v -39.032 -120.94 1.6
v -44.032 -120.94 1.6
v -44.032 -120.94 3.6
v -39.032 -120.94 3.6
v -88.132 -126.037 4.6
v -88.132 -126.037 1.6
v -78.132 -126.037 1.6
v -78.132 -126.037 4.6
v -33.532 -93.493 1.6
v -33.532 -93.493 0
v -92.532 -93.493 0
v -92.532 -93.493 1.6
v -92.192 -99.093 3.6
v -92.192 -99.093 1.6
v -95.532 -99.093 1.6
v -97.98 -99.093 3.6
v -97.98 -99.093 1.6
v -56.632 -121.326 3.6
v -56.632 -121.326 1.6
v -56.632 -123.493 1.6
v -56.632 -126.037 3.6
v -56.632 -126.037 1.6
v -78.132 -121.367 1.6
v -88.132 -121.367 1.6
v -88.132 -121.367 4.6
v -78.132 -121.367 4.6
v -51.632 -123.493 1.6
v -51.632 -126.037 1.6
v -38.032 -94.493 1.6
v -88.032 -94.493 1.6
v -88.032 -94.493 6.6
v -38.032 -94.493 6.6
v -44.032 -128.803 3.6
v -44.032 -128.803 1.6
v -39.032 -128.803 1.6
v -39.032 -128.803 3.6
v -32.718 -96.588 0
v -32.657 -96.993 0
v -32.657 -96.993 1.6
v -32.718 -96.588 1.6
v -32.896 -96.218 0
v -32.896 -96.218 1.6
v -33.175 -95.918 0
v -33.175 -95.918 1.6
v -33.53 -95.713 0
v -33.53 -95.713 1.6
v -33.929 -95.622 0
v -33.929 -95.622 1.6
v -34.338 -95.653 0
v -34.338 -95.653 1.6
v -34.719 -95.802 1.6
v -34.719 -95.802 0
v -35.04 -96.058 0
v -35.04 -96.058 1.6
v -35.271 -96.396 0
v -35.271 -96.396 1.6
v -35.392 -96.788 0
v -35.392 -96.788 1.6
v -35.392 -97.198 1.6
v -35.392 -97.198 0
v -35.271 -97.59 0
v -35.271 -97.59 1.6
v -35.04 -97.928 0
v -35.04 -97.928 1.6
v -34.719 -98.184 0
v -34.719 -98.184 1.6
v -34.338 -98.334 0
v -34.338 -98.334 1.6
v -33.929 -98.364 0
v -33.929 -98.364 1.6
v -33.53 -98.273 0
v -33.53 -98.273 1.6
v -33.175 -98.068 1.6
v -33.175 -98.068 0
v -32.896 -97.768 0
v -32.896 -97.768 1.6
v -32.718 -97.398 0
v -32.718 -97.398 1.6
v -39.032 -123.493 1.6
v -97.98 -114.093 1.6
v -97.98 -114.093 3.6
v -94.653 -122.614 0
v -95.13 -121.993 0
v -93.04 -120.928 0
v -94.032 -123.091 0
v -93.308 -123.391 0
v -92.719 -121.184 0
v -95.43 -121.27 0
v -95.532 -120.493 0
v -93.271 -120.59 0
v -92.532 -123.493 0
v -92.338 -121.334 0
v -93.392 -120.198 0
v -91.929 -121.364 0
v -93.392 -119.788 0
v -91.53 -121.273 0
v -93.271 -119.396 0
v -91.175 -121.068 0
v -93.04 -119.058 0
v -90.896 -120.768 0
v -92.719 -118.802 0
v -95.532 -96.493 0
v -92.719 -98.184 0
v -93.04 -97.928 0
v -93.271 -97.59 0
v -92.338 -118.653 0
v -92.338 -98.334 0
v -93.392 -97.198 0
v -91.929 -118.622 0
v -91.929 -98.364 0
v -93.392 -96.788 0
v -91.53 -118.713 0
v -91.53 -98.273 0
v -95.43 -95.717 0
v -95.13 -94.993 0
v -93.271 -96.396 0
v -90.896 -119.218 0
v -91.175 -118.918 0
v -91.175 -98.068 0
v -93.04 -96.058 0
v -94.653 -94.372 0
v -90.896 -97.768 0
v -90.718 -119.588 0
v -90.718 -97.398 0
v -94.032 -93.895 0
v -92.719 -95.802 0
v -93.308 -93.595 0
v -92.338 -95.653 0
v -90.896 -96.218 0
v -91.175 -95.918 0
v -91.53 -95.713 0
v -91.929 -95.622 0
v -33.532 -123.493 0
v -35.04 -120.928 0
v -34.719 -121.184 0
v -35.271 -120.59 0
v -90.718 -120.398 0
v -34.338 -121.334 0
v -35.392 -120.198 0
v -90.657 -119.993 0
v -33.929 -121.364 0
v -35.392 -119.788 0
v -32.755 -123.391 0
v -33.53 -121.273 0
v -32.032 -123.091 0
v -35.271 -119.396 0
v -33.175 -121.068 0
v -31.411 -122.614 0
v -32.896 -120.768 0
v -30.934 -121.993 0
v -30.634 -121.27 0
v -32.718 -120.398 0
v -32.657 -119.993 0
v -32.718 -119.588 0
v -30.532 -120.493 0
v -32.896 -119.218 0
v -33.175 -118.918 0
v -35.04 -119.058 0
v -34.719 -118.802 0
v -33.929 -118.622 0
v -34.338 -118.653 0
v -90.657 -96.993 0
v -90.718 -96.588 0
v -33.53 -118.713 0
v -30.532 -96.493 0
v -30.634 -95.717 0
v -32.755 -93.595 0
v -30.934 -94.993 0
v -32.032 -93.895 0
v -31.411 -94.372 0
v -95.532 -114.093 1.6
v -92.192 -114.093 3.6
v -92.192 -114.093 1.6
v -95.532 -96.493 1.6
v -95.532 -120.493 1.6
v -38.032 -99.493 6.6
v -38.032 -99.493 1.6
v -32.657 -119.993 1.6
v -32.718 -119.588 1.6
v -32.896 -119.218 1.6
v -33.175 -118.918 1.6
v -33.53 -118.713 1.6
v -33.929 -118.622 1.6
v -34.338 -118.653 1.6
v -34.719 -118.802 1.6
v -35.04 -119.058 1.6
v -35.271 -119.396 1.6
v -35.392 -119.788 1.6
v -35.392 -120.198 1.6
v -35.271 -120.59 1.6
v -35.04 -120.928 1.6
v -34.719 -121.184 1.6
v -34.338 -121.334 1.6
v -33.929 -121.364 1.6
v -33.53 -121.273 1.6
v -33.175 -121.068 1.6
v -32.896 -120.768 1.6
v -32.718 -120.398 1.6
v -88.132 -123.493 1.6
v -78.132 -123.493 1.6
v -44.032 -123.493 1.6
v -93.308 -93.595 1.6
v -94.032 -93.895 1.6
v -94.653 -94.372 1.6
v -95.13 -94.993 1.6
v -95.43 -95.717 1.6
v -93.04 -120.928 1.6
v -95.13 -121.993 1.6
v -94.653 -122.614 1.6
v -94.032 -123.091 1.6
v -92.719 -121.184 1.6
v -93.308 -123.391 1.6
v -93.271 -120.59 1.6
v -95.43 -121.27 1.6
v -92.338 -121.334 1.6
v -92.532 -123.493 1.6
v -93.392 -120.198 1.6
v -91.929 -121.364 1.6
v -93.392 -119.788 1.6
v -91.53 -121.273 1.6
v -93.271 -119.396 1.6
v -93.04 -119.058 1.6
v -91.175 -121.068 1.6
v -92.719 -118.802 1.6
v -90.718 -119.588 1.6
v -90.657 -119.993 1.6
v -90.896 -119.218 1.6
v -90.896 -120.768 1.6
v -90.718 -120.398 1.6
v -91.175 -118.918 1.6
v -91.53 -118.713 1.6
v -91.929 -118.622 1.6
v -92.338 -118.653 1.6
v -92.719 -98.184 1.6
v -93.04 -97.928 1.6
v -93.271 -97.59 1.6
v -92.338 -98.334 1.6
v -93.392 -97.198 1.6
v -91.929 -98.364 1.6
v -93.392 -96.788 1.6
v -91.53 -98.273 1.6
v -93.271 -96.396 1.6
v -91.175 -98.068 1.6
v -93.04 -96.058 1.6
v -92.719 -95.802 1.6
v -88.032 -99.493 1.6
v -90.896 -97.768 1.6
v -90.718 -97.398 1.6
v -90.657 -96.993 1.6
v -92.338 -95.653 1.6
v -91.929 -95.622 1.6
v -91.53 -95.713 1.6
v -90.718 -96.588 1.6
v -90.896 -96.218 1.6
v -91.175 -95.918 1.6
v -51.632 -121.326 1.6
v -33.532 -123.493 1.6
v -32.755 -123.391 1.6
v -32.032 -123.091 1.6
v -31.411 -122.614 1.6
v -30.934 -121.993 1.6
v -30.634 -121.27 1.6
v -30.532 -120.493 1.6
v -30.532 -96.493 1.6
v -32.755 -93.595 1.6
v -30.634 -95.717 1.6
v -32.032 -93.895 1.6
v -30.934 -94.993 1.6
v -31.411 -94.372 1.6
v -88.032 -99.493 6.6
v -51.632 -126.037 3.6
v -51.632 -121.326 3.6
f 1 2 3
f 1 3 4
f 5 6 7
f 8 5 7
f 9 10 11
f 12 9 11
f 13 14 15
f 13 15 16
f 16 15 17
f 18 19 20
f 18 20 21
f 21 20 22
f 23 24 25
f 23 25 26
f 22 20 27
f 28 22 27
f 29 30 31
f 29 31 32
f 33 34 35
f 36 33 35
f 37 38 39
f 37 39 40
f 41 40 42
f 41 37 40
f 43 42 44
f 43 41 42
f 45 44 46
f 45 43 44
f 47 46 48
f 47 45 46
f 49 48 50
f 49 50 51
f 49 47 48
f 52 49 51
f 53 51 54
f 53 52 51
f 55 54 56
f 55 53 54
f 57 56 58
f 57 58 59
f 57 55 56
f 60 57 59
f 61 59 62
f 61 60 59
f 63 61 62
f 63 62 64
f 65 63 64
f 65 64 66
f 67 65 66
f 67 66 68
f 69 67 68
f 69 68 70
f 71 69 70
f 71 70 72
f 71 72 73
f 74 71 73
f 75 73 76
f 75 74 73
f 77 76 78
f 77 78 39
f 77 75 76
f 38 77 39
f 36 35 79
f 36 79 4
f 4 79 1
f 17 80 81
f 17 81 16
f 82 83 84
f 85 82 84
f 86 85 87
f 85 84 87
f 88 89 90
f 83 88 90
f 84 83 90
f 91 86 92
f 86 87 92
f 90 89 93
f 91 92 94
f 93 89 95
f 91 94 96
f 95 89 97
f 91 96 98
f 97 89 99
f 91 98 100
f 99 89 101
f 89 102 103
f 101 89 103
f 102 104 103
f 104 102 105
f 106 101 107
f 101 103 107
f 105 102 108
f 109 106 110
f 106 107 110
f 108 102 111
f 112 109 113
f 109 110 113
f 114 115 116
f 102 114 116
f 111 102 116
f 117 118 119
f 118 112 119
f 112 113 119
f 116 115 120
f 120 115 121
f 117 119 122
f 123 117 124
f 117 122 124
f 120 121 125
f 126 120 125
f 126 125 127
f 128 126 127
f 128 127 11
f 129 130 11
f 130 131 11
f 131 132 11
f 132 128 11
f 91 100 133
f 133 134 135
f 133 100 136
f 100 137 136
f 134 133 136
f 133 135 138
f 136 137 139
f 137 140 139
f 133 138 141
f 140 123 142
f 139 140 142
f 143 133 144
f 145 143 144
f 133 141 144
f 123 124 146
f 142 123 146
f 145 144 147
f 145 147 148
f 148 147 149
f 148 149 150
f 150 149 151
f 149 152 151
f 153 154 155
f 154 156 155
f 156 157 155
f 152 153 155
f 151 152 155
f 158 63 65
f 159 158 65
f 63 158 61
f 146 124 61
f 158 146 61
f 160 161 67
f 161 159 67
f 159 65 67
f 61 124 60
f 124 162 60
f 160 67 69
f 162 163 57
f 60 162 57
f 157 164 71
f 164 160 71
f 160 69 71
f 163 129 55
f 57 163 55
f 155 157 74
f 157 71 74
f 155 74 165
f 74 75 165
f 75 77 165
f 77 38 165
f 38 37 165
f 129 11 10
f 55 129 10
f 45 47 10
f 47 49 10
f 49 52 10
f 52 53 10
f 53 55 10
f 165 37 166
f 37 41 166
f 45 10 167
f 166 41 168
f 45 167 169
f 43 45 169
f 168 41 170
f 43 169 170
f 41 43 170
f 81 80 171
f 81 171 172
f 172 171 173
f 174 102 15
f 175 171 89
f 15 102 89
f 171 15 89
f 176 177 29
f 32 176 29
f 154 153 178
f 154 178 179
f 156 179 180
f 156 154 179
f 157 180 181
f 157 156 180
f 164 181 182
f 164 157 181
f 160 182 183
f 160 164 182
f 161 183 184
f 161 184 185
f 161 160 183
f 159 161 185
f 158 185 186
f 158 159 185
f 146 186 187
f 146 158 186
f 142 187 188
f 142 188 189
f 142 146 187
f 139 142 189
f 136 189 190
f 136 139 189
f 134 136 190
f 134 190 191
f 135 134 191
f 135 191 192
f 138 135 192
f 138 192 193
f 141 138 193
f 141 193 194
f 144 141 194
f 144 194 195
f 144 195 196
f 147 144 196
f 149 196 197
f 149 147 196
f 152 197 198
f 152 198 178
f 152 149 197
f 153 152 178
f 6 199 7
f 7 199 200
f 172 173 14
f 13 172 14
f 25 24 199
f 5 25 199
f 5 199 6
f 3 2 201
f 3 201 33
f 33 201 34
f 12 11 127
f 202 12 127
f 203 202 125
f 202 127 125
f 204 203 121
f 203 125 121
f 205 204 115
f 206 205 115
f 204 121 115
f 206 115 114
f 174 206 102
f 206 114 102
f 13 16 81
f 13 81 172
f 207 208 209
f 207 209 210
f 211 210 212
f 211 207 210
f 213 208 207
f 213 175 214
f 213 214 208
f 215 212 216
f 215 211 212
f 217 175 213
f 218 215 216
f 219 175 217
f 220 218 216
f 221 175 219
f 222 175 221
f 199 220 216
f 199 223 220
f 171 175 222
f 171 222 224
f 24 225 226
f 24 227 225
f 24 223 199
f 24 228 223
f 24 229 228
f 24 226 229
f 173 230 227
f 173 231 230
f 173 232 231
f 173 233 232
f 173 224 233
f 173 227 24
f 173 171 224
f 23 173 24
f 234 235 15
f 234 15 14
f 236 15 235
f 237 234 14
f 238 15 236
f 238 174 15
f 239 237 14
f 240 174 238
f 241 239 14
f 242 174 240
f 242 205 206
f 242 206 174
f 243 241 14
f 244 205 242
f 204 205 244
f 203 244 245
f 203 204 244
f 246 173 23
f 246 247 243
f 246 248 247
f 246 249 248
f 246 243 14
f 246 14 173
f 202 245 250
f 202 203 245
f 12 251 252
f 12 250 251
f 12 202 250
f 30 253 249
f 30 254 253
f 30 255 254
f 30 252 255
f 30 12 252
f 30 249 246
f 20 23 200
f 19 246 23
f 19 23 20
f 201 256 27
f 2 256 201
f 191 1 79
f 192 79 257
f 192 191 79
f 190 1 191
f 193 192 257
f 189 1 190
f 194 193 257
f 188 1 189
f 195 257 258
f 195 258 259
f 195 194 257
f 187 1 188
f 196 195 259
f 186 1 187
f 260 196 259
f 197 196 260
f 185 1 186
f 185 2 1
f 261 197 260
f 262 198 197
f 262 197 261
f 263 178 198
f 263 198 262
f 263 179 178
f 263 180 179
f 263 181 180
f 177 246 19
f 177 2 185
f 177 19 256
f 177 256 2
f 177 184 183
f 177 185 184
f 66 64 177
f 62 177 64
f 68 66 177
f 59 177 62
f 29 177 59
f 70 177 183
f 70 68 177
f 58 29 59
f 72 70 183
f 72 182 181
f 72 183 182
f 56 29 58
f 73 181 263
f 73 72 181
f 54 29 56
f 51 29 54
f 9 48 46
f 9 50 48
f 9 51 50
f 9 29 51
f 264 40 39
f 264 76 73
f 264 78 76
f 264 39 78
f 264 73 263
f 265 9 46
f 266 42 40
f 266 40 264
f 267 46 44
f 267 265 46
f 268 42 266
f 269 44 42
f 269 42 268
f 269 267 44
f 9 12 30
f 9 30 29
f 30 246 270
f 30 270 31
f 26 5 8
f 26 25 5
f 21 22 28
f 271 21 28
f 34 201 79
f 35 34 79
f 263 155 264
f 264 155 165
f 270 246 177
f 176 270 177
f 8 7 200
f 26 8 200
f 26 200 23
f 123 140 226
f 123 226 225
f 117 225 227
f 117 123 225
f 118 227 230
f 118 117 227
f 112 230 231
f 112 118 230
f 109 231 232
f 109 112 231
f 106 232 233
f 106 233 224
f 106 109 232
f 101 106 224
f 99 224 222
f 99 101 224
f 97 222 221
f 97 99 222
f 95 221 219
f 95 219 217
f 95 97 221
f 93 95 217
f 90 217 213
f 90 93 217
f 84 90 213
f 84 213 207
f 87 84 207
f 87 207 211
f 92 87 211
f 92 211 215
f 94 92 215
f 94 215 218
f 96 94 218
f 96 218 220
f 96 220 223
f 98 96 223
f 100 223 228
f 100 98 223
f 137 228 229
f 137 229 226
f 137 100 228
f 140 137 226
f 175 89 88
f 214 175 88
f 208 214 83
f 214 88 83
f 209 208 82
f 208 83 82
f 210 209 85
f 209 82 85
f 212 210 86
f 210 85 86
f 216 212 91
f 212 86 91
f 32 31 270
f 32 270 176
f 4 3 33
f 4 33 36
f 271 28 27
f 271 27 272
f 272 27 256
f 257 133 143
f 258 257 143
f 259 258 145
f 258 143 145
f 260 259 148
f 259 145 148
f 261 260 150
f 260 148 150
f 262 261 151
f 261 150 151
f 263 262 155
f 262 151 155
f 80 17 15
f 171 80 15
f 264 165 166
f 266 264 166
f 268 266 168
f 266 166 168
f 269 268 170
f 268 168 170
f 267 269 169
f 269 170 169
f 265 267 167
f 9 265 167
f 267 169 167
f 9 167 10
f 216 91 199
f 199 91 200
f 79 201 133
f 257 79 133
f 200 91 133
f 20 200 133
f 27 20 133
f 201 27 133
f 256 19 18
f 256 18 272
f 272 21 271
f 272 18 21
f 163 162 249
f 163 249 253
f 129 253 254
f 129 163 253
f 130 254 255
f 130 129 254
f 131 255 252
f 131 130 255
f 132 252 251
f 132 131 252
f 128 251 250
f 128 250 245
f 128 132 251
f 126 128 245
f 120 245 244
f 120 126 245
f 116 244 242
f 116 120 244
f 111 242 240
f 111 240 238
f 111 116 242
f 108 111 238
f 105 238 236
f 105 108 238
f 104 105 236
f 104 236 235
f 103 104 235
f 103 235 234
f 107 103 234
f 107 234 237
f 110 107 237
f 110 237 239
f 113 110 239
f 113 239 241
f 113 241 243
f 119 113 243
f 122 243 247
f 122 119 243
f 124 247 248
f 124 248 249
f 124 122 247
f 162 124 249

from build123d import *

# Parameters (mm, degrees)
F0_R     = 1.375
F1_DEPTH = 1.6
F2_W     = 2.44764
F2_H     = 15
F2_W_2   = 3.340326
F3_DEPTH = 2
F2_W_3   = 50
F2_H_2   = 5
F4_DEPTH = 5
F2_W_4   = 5
F2_H_3   = 2.543583
F2_H_4   = 2.167234
F2_H_5   = 2.553497
F2_H_6   = 5.309687
F5_DEPTH = 2
F2_W_5   = 10
F2_H_7   = 2.125936
F6_DEPTH = 3


with BuildPart() as f1:
    # F0 (on Top) → F1 (new body)
    with BuildSketch(Plane.XY):
        with BuildLine():
            Line((-33.531875, -93.493047), (-92.531875, -93.493047))
            ThreePointArc((-92.531875, -93.493047), (-94.653195, -94.371726), (-95.531875, -96.493047))
            Line((-95.531875, -96.493047), (-95.531875, -120.493047))
            ThreePointArc((-95.531875, -120.493047), (-94.653195, -122.614367), (-92.531875, -123.493047))
            Line((-92.531875, -123.493047), (-33.531875, -123.493047))
            ThreePointArc((-33.531875, -123.493047), (-31.410555, -122.614367), (-30.531875, -120.493047))
            Line((-30.531875, -120.493047), (-30.531875, -96.493047))
            ThreePointArc((-30.531875, -96.493047), (-31.410555, -94.371726), (-33.531875, -93.493047))
        make_face()
        with Locations((-92.031875, -119.993047)):
            Circle(F0_R, mode=Mode.SUBTRACT)
        with Locations((-34.031875, -119.993047)):
            Circle(F0_R, mode=Mode.SUBTRACT)
        with Locations((-92.031875, -96.993047)):
            Circle(F0_R, mode=Mode.SUBTRACT)
        with Locations((-34.031875, -96.993047)):
            Circle(F0_R, mode=Mode.SUBTRACT)
    extrude(amount=F1_DEPTH)

    # F2 (on face) → F3 (join)
    with BuildSketch(Plane.XY.offset(1.6)):
        with Locations((-96.755695, -106.593047)):
            Rectangle(F2_W, F2_H)
        with Locations((-93.861712, -106.593047)):
            Rectangle(F2_W_2, F2_H)
    extrude(amount=F3_DEPTH)

    # F2 (on face) → F4 (join)
    with BuildSketch(Plane.XY.offset(1.6)):
        with Locations((-63.031875, -96.993047)):
            Rectangle(F2_W_3, F2_H_2)
    extrude(amount=F4_DEPTH)

    # F2 (on face) → F5 (join)
    with BuildSketch(Plane.XY.offset(1.6)):
        with Locations((-54.131875, -124.764838)):
            Rectangle(F2_W_4, F2_H_3)
        with Locations((-54.131875, -122.40943)):
            Rectangle(F2_W_4, F2_H_4)
        with Locations((-41.531875, -122.216298)):
            Rectangle(F2_W_4, F2_H_5)
        with Locations((-41.531875, -126.14789)):
            Rectangle(F2_W_4, F2_H_6)
    extrude(amount=F5_DEPTH)

    # F2 (on face) → F6 (join)
    with BuildSketch(Plane.XY.offset(1.6)):
        with Locations((-83.131875, -122.430079)):
            Rectangle(F2_W_5, F2_H_7)
        with Locations((-83.131875, -124.764838)):
            Rectangle(F2_W_5, F2_H_3)
    extrude(amount=F6_DEPTH)


solid = f1.part
